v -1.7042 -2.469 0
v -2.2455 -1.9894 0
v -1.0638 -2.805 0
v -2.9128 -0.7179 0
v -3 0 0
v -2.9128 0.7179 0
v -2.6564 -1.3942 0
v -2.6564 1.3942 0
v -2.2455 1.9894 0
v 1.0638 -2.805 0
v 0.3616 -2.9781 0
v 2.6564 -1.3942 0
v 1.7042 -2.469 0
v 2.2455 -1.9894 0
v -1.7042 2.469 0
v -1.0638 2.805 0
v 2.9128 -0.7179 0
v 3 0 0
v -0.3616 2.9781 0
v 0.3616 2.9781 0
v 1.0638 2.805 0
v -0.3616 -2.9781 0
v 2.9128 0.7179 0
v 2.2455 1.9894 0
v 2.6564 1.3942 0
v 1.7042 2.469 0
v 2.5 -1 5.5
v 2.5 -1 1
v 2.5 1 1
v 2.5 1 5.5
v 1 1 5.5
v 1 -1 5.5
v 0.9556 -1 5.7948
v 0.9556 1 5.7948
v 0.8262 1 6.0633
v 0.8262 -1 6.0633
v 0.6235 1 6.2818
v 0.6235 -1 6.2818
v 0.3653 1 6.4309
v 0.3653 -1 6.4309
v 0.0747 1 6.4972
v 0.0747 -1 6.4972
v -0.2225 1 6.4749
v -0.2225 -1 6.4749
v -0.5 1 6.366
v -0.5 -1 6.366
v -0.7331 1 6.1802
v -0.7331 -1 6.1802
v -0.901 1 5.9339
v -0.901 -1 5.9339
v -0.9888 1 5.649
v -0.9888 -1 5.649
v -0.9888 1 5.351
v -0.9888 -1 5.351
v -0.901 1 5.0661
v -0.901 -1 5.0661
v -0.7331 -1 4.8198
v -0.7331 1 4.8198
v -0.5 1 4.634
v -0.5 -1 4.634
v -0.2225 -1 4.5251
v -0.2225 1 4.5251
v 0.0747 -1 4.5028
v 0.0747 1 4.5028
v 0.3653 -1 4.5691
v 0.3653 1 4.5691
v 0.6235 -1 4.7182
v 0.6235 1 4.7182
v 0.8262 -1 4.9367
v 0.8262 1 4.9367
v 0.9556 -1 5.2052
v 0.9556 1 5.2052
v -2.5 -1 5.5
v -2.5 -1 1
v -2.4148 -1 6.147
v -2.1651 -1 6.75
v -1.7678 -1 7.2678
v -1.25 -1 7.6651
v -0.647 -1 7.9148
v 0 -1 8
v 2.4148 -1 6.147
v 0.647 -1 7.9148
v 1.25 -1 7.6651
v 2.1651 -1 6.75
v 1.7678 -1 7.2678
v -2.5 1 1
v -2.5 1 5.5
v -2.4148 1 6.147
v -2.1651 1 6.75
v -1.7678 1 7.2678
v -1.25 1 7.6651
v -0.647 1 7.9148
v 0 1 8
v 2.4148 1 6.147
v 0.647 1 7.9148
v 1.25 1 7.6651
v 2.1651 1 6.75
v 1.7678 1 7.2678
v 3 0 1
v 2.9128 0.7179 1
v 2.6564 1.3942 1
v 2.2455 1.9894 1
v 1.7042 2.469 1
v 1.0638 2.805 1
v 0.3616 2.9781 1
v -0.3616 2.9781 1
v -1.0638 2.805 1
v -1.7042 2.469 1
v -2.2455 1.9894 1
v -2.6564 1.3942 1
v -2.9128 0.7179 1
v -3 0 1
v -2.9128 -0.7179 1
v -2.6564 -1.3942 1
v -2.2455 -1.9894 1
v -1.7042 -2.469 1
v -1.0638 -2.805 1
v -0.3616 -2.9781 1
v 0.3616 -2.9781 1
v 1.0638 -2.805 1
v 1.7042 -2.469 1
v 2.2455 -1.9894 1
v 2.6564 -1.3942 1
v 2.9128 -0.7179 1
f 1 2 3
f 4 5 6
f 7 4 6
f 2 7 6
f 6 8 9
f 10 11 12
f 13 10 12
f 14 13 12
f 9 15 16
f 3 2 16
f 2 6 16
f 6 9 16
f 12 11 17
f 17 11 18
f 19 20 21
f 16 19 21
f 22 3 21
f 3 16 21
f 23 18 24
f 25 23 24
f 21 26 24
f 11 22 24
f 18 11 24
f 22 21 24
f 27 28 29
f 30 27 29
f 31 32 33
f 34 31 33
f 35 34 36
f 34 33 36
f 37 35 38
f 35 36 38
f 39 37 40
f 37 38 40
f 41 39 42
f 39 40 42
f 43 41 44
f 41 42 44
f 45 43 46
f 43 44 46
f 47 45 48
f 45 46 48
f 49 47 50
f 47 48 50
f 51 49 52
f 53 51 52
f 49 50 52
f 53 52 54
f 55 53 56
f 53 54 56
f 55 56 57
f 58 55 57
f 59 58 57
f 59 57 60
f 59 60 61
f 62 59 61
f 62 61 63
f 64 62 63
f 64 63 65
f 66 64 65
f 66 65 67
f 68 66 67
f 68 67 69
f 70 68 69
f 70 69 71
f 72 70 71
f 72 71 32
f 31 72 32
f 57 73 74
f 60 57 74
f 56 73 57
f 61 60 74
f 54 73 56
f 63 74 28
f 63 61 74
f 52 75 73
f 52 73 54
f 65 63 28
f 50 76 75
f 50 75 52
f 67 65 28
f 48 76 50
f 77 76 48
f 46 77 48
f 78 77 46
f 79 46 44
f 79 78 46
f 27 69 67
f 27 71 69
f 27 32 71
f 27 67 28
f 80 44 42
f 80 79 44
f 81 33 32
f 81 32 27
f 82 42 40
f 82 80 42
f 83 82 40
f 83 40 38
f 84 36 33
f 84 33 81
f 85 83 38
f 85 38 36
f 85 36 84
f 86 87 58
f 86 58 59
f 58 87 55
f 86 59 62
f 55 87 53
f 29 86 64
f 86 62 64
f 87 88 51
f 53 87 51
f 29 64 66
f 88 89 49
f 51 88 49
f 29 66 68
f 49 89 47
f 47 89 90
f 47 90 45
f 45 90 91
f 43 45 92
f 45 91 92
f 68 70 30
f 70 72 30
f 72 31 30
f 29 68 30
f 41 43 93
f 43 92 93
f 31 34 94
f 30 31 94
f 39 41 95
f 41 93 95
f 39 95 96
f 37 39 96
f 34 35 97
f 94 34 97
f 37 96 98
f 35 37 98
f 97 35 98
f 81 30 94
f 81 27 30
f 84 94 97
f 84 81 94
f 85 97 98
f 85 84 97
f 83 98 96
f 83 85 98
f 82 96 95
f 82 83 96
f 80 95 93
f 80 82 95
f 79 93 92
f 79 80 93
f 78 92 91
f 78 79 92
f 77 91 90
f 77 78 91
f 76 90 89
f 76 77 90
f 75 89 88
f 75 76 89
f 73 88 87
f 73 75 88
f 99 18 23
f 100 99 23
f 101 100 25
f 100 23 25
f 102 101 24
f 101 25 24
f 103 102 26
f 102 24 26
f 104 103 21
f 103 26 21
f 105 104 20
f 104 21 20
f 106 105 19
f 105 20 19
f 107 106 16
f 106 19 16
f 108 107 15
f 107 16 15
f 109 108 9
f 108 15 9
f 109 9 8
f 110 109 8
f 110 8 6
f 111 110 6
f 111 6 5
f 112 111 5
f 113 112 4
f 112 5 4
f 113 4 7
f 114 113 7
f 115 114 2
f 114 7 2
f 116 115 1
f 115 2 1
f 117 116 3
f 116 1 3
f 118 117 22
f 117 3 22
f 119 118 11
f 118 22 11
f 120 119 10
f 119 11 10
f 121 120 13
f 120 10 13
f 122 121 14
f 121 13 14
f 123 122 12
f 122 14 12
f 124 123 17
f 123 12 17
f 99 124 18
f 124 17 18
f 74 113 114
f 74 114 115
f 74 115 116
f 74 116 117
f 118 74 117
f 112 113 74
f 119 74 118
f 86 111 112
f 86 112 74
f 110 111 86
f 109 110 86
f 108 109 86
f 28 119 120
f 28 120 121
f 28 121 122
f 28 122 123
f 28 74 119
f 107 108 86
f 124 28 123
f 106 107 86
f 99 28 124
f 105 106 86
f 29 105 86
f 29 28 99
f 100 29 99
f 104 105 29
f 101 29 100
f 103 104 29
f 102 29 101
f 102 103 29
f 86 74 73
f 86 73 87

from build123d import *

# Parameters (mm, degrees)
F0_R     = 3
F1_DEPTH = 1
F2_W     = 5
F2_H     = 2
F3_DEPTH = 4.5
F5_DEPTH = 1
F6_R     = 1
F7_DEPTH = 25


with BuildPart() as f1:
    # F0 (on Top) → F1 (new body)
    with BuildSketch(Plane.XY):
        Circle(F0_R)
    extrude(amount=F1_DEPTH)

    # F2 (on face) → F3 (join)
    with BuildSketch(Plane.XY.offset(1)):
        Rectangle(F2_W, F2_H)
    extrude(amount=F3_DEPTH)

    # F4 (on Front) → F5 (join, symmetric)
    with BuildSketch(Plane.XZ):
        with BuildLine():
            Line((0, 5.5), (2.5, 5.5))
            ThreePointArc((2.5, 5.5), (0, 8), (-2.5, 5.5))
            Line((-2.5, 5.5), (0, 5.5))
        make_face()
    extrude(amount=F5_DEPTH, both=True)

    # F6 (on face) → F7 (cut)
    with BuildSketch(Plane.XZ.offset(1)):
        with Locations((0, 5.5)):
            Circle(F6_R)
    extrude(amount=-F7_DEPTH, mode=Mode.SUBTRACT)


solid = f1.part
